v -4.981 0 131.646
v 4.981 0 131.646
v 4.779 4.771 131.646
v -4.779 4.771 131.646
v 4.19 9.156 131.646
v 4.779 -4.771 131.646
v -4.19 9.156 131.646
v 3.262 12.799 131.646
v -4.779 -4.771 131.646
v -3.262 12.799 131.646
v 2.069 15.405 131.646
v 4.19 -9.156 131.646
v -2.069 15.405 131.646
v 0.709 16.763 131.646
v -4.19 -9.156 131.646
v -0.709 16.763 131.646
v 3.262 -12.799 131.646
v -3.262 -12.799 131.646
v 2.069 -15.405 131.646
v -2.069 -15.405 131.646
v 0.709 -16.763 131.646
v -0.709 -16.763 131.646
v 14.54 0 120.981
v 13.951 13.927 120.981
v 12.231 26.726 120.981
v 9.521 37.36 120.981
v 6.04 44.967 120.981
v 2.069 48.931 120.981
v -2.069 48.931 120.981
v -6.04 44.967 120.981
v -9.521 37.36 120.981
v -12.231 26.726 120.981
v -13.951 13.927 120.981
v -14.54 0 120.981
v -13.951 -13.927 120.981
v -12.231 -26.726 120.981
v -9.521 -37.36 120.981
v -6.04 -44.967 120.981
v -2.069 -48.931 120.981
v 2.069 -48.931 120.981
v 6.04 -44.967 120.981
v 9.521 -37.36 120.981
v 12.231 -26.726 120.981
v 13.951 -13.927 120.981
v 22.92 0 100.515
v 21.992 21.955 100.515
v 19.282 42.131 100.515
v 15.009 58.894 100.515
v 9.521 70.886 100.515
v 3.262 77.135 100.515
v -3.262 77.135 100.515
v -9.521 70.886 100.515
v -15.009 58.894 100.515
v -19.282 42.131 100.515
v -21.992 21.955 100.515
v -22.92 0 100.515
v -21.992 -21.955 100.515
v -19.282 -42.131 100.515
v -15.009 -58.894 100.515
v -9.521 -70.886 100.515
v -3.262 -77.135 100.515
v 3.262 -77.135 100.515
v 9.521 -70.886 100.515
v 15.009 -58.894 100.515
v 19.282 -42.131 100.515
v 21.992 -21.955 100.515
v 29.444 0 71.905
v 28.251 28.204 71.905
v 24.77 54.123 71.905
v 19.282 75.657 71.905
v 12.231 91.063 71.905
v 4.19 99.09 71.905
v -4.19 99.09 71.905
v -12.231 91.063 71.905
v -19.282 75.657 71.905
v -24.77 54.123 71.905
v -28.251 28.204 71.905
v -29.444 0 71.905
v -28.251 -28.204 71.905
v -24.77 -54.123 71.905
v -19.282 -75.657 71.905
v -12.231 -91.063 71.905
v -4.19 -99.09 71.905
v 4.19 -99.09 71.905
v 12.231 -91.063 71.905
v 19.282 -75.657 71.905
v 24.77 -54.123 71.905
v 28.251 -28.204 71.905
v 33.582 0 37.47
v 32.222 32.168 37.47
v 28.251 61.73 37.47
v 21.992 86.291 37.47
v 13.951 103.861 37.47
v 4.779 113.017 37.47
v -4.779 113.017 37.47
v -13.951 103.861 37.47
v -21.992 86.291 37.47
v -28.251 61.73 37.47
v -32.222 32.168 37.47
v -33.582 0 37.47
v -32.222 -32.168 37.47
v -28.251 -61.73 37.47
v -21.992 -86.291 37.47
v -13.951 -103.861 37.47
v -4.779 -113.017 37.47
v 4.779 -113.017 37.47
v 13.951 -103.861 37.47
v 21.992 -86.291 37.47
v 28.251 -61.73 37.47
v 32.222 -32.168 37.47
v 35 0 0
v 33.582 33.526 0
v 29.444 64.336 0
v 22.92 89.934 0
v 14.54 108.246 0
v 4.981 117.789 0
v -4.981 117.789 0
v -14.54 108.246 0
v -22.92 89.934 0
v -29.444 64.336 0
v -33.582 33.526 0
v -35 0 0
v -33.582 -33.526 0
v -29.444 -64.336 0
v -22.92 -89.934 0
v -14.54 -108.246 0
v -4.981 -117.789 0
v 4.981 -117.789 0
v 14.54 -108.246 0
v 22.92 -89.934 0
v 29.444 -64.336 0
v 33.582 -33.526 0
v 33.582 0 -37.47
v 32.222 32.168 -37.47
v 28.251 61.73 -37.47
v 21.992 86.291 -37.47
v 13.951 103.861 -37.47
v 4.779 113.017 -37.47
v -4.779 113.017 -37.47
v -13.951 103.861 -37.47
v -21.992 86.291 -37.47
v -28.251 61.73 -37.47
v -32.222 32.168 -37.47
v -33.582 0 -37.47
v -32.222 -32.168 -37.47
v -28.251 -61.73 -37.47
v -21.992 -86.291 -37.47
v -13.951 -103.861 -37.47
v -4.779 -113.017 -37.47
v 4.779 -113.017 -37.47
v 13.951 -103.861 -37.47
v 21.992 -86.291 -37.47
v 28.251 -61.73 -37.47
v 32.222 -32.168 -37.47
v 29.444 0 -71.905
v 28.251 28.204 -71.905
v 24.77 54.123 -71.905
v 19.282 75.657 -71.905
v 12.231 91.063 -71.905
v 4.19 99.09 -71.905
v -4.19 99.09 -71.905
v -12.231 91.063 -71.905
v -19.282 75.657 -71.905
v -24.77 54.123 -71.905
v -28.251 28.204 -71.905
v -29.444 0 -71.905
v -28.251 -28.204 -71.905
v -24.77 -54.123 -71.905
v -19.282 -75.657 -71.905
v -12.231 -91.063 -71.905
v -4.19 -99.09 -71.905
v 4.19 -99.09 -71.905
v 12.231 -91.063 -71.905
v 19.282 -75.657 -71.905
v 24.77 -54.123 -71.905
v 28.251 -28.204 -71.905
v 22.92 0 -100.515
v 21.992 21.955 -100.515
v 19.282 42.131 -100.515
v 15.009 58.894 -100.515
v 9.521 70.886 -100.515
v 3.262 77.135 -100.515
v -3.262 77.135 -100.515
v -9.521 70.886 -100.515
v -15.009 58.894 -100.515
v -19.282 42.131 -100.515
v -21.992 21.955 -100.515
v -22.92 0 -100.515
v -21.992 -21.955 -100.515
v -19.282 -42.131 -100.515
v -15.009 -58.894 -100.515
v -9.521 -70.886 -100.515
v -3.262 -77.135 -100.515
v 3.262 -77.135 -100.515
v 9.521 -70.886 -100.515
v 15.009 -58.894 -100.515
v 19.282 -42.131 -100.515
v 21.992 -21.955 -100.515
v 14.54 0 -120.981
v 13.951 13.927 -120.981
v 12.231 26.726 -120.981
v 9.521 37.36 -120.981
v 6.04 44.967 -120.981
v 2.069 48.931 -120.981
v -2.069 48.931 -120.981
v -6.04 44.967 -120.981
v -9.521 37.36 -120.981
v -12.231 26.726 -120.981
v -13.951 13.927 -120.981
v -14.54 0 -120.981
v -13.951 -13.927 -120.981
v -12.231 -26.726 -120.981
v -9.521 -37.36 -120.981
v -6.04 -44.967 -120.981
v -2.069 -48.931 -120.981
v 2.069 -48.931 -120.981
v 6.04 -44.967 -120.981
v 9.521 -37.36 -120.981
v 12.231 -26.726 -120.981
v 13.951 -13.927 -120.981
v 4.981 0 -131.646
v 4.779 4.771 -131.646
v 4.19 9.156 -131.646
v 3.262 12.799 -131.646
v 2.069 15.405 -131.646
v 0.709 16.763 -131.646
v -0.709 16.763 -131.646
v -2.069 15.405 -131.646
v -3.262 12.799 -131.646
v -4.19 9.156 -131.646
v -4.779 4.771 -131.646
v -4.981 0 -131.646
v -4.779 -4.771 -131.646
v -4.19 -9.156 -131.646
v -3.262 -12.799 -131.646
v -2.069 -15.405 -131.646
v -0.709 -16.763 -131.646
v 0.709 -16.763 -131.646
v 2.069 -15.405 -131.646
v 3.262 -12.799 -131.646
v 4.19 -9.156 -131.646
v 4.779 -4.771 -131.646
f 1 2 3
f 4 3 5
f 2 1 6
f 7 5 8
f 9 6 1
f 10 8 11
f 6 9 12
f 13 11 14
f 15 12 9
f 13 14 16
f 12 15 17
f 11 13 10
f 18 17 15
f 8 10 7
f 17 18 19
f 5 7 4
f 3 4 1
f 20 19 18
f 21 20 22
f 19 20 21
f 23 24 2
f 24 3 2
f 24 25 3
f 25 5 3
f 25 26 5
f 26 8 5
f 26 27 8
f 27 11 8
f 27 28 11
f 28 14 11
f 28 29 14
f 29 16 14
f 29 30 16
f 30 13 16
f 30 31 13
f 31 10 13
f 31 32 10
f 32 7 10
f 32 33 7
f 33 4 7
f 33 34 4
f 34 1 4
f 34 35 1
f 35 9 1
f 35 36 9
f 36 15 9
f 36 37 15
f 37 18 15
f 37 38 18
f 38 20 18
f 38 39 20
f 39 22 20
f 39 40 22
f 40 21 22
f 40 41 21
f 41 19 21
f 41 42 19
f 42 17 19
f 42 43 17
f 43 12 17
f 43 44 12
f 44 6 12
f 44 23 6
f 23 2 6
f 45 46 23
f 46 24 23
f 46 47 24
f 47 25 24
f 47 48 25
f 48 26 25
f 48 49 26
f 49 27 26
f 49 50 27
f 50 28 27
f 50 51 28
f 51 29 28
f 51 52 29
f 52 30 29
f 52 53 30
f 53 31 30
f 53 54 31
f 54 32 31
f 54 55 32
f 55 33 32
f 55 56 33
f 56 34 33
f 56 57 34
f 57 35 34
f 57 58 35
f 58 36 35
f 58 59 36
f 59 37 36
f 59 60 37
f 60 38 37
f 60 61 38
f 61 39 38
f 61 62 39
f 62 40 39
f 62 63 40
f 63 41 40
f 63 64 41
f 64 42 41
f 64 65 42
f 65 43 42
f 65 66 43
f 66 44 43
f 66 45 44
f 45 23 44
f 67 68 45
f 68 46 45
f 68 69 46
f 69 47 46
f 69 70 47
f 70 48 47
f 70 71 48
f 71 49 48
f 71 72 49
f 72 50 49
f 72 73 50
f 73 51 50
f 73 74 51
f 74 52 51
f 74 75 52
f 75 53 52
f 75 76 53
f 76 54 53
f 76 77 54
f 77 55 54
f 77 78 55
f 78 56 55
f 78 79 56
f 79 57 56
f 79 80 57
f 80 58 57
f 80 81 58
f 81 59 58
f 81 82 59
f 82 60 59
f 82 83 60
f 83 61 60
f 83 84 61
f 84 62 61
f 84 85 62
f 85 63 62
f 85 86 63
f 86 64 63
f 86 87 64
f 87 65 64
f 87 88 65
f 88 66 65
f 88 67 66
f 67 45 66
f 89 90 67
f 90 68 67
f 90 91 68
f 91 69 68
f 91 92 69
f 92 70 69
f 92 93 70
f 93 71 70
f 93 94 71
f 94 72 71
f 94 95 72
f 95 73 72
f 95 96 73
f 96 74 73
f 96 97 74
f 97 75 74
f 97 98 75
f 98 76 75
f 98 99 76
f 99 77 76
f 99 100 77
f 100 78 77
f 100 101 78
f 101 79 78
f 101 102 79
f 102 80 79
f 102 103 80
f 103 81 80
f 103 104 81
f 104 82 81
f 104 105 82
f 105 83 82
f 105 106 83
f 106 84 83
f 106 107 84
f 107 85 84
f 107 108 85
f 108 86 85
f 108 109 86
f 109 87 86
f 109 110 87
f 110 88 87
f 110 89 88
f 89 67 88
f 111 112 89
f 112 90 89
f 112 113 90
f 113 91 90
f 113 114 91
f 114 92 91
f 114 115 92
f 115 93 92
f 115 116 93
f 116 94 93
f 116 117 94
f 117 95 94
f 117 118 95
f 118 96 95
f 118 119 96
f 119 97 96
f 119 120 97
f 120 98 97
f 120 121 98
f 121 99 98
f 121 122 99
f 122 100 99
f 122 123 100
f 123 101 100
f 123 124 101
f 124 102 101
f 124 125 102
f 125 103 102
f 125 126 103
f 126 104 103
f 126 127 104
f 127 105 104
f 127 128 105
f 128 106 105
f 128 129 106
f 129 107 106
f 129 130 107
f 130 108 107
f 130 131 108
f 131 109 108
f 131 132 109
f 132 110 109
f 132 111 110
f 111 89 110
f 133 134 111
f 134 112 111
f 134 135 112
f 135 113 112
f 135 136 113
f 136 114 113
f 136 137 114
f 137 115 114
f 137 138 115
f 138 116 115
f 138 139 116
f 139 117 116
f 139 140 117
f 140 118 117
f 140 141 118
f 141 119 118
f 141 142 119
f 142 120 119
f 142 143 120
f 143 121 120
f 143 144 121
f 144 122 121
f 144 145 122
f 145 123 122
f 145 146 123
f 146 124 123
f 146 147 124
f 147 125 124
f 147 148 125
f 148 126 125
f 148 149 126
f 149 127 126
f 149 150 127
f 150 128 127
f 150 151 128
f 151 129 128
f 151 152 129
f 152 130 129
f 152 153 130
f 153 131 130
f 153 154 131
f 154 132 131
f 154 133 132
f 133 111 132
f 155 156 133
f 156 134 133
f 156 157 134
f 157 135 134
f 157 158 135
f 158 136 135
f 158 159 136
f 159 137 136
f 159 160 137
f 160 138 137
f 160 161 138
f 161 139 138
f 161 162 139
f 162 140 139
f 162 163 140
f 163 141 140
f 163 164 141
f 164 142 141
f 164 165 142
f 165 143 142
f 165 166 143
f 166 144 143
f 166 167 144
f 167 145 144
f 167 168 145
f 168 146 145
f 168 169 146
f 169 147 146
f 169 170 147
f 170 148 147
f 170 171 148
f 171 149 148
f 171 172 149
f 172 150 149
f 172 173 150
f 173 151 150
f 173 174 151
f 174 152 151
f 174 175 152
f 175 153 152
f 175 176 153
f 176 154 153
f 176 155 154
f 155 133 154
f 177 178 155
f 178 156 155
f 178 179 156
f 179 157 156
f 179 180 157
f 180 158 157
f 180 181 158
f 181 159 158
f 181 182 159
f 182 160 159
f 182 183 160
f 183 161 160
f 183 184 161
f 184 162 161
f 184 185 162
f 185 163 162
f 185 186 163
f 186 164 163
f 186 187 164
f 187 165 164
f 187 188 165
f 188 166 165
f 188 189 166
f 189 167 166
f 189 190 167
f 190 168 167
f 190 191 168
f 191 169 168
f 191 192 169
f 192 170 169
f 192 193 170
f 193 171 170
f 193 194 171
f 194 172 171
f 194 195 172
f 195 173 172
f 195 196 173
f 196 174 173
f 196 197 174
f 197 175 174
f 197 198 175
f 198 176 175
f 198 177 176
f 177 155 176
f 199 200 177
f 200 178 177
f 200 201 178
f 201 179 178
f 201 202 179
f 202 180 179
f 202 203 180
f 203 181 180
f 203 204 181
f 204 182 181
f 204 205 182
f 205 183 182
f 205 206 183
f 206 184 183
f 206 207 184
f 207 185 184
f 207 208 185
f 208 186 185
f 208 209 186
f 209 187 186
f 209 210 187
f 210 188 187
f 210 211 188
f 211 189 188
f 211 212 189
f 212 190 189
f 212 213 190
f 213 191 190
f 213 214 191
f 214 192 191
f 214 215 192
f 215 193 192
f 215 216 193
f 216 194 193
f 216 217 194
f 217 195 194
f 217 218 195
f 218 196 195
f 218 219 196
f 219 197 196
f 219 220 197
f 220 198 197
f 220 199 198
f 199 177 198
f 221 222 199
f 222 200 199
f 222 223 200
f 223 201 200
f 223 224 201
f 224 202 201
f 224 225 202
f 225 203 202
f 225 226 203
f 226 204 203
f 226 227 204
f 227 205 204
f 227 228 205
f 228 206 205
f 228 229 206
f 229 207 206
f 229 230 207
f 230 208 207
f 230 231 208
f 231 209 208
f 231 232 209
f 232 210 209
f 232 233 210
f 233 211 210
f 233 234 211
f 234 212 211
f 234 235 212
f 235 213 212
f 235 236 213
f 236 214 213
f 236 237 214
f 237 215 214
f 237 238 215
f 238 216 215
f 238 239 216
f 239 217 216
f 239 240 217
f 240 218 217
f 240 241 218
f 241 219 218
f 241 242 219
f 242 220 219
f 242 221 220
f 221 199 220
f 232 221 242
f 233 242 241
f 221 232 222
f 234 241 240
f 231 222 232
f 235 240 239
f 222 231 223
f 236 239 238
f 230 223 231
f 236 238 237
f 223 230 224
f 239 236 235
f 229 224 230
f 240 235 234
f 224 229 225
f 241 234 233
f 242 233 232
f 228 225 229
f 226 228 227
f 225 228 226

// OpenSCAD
// Generated by SolidPython 1.0.1 on 2020-07-29 00:46:47


scale(v = [5, 17, 19]) {
	sphere(r = 7);
}
/***********************************************
*********      SolidPython code:      **********
************************************************
 
# import packages: SolidPython
from solid import *
from solid.utils import *
from itertools import chain, combinations, permutations


class Resize:

    def __init__(self, scad_file):
        self.scad_file = scad_file
        #self.scad_file = import_scad(scad_file)
        # cone/cylinder param:
        self.r1 = 0
        self.r2 = 0
        self.h = 0
        # rectangular prism param:
        self.w = 0
        self.l = 0
        # ellipse param:
        self.r = 0

    # import OpenScad code (file name corresponds to shape)


    # classify shape + parameters
    def assign(self, param1, param2, param3):
        if self.scad_file == 'cone.scad':
            self.r1 = param1
            self.r2 = param2
            self.h = param3
        elif self.scad_file == 'cylinder.scad':
            self.r1 = param1
            self.r2 = param2
            self.h = param3
        elif self.scad_file == 'rectangularPrism.scad':
            self.h = param1
            self.l = param2
            self.w = param3
        else:
            self.r = param1
            self.h = param2

    # resize parameters
    def iterate(self):
        x = range(3, 20, 2)
        i = 1
        if self.scad_file == 'cone.scad':
            tempList = list(permutations(x, 2))
            for temp in tempList:
                param1 = temp[0]
                param2 = temp[1]
                filepath = 'produced_scad_files/' + 'cone' + str(param1) + '_' + str(param2) + '_' + '.scad'
                scad_render_to_file(cylinder(h=param1, r1=param2, r2=0), filepath)

        elif self.scad_file == 'cylinder.scad':
            tempList = list(permutations(x, 3))
            for temp in tempList:
                param1 = temp[0]
                param2 = temp[1]
                filepath = 'produced_scad_files/' + 'cylinder' + str(param1) + '_' + str(param2) + '_' + '.scad'
                scad_render_to_file(cylinder(h=param1, r1=param2, r2=param2), filepath)

        elif self.scad_file == 'rectangularPrism.scad':
            tempList = list(permutations(x, 3))
            for temp in tempList:
                param1 = temp[0]
                param2 = temp[1]
                param3 = temp[2]
                filepath = 'produced_scad_files/' + 'rectangularPrism' + str(param1) + '_' + str(param2) + '_' + str(
                    param3) + '.scad'
                scad_render_to_file(cube(size=(param1, param2, param3)), filepath)

        elif self.scad_file == 'ellipse.scad':
            tempList = list(permutations(x, 4))
            for temp in tempList:
                param1 = temp[0]
                param2 = temp[1]
                param3 = temp[2]
                param4 = temp[3]
                filepath = 'produced_scad_files/' + 'ellipse' + str(param1) + '_' + str(param2) + '_' + str(param3) + '_' + str(param4) + '.scad'
                scad_render_to_file(scale([param1, param2, param3])(sphere(r=param4)), filepath)

    def render_to_scadfile(self):
        scad_render_to_file(scad, 'example.scad') 
 
************************************************/
